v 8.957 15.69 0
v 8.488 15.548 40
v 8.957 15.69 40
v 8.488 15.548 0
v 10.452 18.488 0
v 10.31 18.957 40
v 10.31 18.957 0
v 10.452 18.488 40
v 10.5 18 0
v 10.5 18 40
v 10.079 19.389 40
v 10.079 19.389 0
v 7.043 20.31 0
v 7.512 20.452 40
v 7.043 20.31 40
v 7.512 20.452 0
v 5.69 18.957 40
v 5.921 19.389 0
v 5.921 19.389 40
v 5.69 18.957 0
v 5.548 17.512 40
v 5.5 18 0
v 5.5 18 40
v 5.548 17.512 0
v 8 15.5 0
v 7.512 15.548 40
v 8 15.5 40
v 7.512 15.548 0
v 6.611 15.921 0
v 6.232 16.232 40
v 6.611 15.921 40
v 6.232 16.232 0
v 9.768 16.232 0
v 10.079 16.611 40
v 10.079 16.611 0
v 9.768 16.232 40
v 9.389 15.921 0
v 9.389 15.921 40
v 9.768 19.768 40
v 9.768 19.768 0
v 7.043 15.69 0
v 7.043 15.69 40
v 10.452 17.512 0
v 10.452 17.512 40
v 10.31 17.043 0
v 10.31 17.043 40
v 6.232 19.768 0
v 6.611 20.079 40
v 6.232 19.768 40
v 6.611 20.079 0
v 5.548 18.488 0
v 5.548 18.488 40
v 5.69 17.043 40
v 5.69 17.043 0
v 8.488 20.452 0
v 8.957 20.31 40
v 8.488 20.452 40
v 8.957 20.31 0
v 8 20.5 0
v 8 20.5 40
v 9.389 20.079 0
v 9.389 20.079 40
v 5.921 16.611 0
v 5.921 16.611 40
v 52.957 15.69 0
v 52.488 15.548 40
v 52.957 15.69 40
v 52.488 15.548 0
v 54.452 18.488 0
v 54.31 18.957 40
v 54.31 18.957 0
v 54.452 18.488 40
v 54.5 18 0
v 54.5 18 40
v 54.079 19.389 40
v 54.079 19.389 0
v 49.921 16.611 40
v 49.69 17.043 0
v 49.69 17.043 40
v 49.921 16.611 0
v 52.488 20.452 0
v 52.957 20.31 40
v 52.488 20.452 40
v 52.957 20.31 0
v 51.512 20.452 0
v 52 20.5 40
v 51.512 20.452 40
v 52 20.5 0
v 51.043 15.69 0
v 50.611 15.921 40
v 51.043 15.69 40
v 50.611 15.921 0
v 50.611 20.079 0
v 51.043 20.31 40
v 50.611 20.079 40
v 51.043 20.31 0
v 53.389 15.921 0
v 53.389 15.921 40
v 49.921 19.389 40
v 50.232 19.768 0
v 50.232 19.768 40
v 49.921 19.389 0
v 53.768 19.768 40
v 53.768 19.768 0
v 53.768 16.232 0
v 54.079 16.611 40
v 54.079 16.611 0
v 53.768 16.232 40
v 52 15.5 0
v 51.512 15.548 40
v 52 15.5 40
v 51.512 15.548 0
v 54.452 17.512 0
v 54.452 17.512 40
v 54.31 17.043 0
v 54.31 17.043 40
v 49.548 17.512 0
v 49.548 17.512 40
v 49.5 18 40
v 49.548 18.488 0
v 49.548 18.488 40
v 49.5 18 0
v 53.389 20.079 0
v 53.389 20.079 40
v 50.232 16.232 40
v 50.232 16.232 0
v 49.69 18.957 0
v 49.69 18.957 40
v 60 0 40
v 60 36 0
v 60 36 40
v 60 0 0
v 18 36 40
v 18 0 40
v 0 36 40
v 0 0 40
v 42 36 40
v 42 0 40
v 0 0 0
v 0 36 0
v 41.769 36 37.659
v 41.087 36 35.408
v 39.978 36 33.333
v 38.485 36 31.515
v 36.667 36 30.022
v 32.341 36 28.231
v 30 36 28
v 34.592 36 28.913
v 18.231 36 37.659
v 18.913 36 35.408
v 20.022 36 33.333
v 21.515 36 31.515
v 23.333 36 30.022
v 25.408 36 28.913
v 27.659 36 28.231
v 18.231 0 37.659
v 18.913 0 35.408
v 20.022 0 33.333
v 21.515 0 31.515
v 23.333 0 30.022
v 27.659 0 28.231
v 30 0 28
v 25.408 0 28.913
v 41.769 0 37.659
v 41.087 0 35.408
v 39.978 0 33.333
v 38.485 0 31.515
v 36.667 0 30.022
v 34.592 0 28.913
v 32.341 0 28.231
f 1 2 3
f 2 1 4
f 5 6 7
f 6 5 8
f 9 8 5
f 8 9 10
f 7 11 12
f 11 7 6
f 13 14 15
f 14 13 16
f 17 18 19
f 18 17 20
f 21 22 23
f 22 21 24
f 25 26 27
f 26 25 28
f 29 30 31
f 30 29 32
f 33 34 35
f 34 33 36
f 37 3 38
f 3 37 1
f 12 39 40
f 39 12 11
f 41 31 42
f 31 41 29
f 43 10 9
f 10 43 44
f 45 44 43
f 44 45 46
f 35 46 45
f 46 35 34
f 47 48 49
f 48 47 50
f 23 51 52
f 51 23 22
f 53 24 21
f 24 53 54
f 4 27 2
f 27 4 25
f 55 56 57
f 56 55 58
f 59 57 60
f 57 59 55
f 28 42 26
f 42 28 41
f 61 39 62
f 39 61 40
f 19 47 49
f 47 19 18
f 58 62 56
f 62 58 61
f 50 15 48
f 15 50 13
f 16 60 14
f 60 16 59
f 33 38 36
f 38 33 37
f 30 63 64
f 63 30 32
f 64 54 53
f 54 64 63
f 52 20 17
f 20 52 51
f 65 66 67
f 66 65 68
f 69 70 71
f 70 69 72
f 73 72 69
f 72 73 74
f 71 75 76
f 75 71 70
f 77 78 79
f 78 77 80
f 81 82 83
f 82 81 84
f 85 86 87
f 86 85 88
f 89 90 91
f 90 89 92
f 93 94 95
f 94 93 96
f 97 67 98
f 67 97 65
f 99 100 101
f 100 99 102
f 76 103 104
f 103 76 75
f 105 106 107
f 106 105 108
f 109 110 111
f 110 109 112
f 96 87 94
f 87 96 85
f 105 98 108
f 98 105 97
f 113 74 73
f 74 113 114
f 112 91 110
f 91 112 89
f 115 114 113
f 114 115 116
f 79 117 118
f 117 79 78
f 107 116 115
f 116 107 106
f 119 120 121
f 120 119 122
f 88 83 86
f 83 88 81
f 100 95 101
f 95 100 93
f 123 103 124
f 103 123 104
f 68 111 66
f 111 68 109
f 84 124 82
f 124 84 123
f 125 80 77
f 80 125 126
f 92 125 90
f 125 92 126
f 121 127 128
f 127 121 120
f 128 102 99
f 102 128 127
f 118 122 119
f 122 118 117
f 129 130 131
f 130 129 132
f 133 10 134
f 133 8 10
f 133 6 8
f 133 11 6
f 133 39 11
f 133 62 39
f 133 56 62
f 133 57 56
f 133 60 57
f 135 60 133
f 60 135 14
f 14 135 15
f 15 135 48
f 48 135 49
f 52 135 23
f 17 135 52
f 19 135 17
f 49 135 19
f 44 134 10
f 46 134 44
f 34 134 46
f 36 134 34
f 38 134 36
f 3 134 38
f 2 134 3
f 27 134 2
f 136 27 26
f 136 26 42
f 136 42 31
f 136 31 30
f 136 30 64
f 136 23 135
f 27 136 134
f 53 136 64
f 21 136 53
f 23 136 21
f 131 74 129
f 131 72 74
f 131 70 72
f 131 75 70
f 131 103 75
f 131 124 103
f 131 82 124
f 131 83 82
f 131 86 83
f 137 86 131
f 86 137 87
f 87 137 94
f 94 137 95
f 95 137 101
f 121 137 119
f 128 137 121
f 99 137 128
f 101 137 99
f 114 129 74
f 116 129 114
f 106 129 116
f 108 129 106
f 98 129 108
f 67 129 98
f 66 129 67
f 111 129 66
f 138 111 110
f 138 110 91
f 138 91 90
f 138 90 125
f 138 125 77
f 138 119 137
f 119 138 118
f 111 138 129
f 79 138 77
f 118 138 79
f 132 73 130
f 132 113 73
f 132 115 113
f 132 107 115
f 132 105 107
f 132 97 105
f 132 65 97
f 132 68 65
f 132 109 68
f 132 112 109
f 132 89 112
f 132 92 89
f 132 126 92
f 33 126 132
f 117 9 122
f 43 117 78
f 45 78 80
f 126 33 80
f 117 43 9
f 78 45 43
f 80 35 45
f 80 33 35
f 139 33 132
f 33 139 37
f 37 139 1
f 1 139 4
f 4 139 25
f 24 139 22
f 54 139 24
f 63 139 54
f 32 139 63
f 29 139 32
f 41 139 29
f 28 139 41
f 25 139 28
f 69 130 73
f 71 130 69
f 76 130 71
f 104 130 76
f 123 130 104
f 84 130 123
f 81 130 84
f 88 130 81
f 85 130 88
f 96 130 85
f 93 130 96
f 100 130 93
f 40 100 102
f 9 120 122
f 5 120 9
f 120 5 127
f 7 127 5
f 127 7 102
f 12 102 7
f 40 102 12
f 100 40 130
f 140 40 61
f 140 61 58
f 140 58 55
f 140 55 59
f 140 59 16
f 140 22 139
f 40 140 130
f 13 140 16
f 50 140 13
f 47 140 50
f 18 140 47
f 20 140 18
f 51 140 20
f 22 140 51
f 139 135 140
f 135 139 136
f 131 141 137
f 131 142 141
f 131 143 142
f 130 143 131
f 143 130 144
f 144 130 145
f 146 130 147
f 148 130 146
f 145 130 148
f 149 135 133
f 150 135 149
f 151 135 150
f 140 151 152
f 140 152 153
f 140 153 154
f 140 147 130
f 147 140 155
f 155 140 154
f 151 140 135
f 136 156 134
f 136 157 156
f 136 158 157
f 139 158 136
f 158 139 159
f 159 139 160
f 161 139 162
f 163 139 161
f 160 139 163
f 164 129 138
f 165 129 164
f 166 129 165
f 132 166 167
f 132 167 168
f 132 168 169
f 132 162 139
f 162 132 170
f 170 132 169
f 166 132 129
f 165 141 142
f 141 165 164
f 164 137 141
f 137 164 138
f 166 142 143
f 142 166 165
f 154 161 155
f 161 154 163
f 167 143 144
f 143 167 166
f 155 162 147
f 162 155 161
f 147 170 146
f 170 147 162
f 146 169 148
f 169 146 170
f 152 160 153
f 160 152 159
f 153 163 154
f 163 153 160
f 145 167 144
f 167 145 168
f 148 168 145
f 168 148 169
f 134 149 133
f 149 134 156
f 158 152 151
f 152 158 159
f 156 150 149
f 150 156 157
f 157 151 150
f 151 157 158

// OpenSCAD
$fn = 32;

// ----------------------------------------------------------------------
// Saddle clamp: plain shaft clamp
// ----------------------------------------------------------------------

// --- parameters (mm) ---
blk_l = 60;               // block length, X
blk_w = 36;               // block width, Y
blk_h = 40;               // block height
clamp_r = 12;             // shaft groove radius
hole_r = 2.5;             // bolt hole radius
hole_m = 8;               // bolt hole margin from the ends

saw_depth = clamp_r + 3;  // saw kerf depth

difference() {
  cube([blk_l, blk_w, blk_h]);
  translate([blk_l / 2, -1, blk_h])
    rotate([-90, 0, 0])
      cylinder(h = blk_w + 2, r = clamp_r);
  for (sx = [0, 1])
    translate([sx ? blk_l - hole_m : hole_m, blk_w / 2, -1])
      cylinder(r = hole_r, h = blk_h + 2);
}
